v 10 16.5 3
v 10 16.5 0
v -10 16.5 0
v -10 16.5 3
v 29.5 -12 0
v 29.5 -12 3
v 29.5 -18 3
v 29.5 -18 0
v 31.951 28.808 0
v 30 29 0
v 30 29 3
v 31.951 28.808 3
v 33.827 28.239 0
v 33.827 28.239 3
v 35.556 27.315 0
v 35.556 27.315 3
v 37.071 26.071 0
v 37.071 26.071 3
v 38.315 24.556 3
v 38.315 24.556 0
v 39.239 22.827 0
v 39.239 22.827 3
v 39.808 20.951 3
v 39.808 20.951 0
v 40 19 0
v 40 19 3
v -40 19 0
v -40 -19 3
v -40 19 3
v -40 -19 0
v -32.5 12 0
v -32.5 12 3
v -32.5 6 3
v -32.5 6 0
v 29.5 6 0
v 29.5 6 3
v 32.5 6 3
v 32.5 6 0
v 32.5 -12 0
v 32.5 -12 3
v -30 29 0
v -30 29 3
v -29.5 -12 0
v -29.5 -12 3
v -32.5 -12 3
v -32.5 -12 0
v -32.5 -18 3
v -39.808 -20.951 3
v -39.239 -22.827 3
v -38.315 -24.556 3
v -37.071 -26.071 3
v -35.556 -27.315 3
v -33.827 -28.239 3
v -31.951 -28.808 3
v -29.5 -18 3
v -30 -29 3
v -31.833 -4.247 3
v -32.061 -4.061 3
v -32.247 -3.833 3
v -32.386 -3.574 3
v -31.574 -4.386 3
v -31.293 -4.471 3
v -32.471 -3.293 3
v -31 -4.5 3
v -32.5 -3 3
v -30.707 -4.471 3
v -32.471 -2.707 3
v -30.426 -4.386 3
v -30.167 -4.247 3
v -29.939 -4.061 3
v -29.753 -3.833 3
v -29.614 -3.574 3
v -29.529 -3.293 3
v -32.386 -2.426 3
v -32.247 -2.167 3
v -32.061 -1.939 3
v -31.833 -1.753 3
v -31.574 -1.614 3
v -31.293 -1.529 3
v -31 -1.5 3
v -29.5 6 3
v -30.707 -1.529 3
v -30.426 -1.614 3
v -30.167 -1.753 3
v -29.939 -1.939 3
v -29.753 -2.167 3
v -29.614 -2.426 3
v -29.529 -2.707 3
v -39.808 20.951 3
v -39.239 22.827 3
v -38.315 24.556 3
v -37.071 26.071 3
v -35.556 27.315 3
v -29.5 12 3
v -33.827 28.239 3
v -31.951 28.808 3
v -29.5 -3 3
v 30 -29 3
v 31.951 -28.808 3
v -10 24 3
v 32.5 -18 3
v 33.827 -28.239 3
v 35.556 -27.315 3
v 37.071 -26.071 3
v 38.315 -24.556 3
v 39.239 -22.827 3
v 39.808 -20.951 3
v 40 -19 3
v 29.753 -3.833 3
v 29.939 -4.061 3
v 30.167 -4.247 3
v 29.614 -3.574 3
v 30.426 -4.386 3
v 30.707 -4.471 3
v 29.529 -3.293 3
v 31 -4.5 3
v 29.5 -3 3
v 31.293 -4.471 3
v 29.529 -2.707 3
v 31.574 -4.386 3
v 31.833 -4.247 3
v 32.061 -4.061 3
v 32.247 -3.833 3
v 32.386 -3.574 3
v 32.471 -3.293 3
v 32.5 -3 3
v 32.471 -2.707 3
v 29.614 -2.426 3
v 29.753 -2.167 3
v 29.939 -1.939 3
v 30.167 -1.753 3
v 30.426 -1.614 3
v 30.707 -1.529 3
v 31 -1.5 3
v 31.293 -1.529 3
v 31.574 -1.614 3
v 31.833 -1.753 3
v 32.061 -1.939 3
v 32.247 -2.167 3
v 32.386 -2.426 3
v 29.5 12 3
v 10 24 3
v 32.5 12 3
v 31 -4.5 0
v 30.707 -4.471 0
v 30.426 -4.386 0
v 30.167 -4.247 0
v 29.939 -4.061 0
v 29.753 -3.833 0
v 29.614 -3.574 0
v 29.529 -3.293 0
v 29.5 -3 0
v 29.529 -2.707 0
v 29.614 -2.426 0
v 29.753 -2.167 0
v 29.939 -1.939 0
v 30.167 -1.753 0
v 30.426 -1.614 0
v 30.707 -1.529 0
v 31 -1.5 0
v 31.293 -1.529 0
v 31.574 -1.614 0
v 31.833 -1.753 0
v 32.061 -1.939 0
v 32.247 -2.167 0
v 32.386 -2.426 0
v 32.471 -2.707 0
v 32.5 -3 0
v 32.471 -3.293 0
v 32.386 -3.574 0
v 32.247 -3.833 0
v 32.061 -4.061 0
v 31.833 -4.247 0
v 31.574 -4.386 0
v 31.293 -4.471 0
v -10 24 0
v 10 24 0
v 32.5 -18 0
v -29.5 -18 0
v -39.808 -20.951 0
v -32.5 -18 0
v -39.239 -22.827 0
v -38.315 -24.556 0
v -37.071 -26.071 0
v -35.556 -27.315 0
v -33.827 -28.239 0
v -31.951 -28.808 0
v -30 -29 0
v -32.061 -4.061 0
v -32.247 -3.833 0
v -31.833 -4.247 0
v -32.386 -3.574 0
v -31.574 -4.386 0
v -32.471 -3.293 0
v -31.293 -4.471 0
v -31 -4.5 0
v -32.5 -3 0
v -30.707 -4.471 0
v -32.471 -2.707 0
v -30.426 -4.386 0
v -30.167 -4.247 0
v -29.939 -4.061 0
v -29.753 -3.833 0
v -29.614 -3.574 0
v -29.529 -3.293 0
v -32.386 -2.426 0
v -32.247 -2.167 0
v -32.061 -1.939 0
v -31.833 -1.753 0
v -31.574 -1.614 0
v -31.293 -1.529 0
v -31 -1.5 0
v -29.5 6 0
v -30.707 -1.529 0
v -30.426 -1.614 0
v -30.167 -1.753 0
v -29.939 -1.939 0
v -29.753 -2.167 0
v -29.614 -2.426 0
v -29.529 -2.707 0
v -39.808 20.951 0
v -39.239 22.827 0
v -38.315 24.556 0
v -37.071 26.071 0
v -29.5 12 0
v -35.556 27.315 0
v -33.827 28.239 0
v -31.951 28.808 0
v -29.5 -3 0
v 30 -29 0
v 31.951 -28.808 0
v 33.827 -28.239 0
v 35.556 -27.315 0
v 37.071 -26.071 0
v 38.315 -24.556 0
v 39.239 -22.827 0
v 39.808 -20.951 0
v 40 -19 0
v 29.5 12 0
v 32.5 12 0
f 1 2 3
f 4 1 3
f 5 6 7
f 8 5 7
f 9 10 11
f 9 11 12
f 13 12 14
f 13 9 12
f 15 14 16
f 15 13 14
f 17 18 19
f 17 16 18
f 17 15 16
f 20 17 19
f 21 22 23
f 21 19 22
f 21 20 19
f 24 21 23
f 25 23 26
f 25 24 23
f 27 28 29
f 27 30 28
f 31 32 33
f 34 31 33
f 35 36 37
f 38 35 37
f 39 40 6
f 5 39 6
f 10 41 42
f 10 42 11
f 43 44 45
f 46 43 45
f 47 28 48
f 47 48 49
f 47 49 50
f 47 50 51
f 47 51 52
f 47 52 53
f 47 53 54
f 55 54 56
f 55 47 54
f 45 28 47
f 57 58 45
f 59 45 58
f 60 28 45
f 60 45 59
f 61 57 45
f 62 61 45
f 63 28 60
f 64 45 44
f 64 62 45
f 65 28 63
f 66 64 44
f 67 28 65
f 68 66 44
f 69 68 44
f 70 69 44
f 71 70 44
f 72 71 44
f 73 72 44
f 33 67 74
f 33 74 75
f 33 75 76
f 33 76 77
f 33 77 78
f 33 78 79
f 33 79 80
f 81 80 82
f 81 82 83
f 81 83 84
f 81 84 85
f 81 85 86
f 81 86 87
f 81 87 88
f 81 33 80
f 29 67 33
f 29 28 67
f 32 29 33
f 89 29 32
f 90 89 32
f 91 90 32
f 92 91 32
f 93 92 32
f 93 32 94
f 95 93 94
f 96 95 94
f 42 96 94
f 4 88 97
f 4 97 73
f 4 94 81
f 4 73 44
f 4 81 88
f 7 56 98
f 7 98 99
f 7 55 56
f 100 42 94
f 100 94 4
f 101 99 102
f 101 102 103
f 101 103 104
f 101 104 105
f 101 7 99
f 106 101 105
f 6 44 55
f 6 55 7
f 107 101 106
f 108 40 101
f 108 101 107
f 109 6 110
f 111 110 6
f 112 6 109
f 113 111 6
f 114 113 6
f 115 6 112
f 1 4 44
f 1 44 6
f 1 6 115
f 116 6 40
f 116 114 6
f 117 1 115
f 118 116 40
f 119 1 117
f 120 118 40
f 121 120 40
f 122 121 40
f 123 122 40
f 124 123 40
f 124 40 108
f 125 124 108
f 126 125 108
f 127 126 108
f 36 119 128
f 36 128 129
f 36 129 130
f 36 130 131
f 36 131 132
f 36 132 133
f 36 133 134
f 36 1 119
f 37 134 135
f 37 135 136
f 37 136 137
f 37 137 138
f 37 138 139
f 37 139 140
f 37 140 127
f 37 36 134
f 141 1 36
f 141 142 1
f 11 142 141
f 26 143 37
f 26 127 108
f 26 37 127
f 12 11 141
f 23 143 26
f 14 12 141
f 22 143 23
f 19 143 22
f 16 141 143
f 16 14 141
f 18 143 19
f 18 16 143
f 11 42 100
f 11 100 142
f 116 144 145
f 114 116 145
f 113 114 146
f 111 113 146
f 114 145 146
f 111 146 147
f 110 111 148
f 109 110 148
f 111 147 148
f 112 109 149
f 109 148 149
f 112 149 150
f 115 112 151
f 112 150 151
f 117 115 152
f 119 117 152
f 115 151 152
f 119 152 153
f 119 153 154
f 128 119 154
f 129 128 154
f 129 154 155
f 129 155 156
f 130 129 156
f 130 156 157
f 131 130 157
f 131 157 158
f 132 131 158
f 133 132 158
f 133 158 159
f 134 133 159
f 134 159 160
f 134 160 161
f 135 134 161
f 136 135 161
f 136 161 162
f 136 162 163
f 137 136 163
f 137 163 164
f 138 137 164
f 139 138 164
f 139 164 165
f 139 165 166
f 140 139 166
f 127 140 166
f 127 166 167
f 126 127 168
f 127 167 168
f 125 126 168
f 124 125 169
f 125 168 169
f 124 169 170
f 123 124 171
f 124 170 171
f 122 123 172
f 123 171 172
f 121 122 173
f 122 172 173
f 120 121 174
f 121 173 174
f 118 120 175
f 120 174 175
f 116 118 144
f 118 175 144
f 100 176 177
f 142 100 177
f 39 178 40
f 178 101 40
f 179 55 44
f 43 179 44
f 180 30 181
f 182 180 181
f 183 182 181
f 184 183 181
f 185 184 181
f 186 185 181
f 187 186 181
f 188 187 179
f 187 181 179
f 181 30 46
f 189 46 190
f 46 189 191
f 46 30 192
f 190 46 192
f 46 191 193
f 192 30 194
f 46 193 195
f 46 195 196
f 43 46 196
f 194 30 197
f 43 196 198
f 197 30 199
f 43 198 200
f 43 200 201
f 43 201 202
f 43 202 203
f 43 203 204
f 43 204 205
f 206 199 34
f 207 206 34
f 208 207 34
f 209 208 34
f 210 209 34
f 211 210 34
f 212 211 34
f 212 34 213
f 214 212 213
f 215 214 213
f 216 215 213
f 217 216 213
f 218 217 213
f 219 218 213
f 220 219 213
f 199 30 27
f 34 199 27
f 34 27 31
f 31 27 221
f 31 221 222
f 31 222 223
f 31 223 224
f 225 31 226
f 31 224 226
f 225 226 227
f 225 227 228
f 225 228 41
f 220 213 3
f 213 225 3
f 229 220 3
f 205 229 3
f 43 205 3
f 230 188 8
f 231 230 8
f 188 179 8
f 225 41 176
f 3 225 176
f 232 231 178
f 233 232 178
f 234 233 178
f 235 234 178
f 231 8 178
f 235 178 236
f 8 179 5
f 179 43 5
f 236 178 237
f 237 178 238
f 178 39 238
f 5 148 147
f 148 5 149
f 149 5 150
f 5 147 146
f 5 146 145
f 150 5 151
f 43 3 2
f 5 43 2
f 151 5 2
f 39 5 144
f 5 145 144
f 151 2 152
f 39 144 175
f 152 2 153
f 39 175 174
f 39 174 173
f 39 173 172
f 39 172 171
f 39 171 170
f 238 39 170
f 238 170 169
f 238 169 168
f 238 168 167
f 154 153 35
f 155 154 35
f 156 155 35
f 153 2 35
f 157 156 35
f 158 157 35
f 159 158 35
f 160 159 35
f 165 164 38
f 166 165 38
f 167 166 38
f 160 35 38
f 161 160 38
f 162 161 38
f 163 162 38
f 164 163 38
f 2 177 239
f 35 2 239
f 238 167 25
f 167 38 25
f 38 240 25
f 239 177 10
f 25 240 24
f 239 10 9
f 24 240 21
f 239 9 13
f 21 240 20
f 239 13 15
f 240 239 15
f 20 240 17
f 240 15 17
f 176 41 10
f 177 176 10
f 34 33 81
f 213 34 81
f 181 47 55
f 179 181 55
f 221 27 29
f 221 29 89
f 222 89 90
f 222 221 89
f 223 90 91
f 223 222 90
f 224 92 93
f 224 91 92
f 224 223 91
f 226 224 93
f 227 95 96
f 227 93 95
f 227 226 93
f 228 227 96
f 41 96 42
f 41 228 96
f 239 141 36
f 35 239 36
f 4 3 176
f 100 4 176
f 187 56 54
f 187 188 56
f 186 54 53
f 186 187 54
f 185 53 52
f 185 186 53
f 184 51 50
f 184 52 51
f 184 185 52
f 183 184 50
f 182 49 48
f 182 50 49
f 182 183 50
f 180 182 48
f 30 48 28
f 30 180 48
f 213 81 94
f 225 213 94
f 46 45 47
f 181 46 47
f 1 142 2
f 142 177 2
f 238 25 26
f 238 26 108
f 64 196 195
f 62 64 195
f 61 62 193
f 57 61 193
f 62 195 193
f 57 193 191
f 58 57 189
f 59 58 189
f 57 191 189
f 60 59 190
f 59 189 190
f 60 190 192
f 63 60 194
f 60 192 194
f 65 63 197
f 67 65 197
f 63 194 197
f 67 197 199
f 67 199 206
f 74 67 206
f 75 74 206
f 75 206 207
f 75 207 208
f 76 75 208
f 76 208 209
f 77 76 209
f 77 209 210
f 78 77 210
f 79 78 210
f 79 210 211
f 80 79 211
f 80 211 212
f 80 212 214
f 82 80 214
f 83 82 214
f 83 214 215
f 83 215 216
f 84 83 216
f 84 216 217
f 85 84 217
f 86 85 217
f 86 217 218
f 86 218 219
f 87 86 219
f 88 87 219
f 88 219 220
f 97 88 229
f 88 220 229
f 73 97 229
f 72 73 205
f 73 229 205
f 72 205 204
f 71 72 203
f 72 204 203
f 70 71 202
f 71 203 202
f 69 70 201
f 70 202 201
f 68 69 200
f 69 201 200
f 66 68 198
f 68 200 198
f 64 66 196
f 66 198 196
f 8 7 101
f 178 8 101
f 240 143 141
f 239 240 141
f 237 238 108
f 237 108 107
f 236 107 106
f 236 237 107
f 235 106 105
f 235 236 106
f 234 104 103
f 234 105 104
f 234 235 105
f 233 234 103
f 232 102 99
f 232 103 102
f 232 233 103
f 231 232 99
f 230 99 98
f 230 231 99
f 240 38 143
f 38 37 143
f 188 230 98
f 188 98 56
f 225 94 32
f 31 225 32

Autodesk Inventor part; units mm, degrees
ref_plane "YZ Plane" through (0, 0, 0) normal (1, 0, 0) x (0, 1, 0)
ref_plane "XZ Plane" through (0, 0, 0) normal (0, 1, 0) x (-1, 0, 0)
ref_plane "XY Plane" through (0, 0, 0) normal (0, 0, 1) x (1, 0, 0)
sketch "Sketch1" plane through (0, 0, 0) normal (0, 0, 1) x (1, 0, 0)
  line L0 (-30, 29) -> (30, 29)
  line L1 (40, 19) -> (40, -19)
  line L2 (30, -29) -> (-30, -29)
  line L3 (-40, -19) -> (-40, 19)
  arc A0 (-30, 29) -> (-40, 19) centre (-30, 19) ccw
  arc A1 (40, 19) -> (30, 29) centre (30, 19) ccw
  arc A2 (-40, -19) -> (-30, -29) centre (-30, -19) ccw
  arc A3 (30, -29) -> (40, -19) centre (30, -19) ccw
  line L4 (-10, 24) -> (10, 24)
  line L5 (10, 24) -> (10, 16.5)
  line L6 (10, 16.5) -> (-10, 16.5)
  line L7 (-10, 16.5) -> (-10, 24)
  point P0 (0, 0)
  point P1 (-40, 29)
  point P2 (40, -29)
  point P3 (40, 29)
  point P4 (-40, -29)
  point P5 (40, 0)
  point P6 (0, 29)
  point P7 (0, 16.5)
  dimension "d0" = 58
  dimension "d1" = 80
  dimension "d4" = 10
  dimension "d13" = 5
  dimension "d14" = 7.5
  dimension "d15" = 20
extrude "Extrusion1" add sketch "Sketch1" along normal blind 3
sketch "Sketch2" plane through (0, 0, 3) normal (0, 0, 1) x (1, 0, 0)
  line L0 (30, 29) -> (-30, 29) projected
  arc A0 (-30, 29) -> (-40, 19) centre (-30, 19) ccw projected
  line L1 (-40, 19) -> (-40, -19) projected
  arc A1 (-40, -19) -> (-30, -29) centre (-30, -19) ccw projected
  line L2 (-30, -29) -> (30, -29) projected
  arc A2 (30, -29) -> (40, -19) centre (30, -19) ccw projected
  line L3 (40, -19) -> (40, 19) projected
  arc A3 (40, 19) -> (30, 29) centre (30, 19) ccw projected
  line L4 (-32.5, -18) -> (-29.5, -18)
  line L5 (-29.5, -18) -> (-29.5, -12)
  line L6 (-29.5, -12) -> (-32.5, -12)
  line L7 (-32.5, -12) -> (-32.5, -18)
  line L8 (-32.5, 6) -> (-29.5, 6)
  line L9 (-29.5, 6) -> (-29.5, 12)
  line L10 (-29.5, 12) -> (-32.5, 12)
  line L11 (-32.5, 12) -> (-32.5, 6)
  line L12 (29.5, -18) -> (32.5, -18)
  line L13 (32.5, -18) -> (32.5, -12)
  line L14 (32.5, -12) -> (29.5, -12)
  line L15 (29.5, -12) -> (29.5, -18)
  line L16 (29.5, 6) -> (32.5, 6)
  line L17 (32.5, 6) -> (32.5, 12)
  line L18 (32.5, 12) -> (29.5, 12)
  line L19 (29.5, 12) -> (29.5, 6)
  line L20 (-31, 6) -> (-31, -12) construction
  point P0 (0, 0)
  point P1 (-31, -3)
  point P2 (31, -3)
  point P3 (31, 6)
  point P4 (-31, -3)
  dimension "d5" = 62
  dimension "d17" = 31
  dimension "d18" = 3
  dimension "d19" = 6
  dimension "d20" = 3
  dimension "d21" = 18
hole "Hole1" at (-31, -3, 3) at (31, -3, 3) direction (0, 0, -1) diameter 3 end through all
extrude "Extrusion2" cut sketch "Sketch2" against normal up to next contours L7 L6 L5 L4 | L11 L10 L9 L8 | L15 L14 L13 L12 | L19 L18 L17 L16
equation "\"d17\" = 0.5 * d5"
properties part number "Front_panel" material "Polycarbonate, Clear"
